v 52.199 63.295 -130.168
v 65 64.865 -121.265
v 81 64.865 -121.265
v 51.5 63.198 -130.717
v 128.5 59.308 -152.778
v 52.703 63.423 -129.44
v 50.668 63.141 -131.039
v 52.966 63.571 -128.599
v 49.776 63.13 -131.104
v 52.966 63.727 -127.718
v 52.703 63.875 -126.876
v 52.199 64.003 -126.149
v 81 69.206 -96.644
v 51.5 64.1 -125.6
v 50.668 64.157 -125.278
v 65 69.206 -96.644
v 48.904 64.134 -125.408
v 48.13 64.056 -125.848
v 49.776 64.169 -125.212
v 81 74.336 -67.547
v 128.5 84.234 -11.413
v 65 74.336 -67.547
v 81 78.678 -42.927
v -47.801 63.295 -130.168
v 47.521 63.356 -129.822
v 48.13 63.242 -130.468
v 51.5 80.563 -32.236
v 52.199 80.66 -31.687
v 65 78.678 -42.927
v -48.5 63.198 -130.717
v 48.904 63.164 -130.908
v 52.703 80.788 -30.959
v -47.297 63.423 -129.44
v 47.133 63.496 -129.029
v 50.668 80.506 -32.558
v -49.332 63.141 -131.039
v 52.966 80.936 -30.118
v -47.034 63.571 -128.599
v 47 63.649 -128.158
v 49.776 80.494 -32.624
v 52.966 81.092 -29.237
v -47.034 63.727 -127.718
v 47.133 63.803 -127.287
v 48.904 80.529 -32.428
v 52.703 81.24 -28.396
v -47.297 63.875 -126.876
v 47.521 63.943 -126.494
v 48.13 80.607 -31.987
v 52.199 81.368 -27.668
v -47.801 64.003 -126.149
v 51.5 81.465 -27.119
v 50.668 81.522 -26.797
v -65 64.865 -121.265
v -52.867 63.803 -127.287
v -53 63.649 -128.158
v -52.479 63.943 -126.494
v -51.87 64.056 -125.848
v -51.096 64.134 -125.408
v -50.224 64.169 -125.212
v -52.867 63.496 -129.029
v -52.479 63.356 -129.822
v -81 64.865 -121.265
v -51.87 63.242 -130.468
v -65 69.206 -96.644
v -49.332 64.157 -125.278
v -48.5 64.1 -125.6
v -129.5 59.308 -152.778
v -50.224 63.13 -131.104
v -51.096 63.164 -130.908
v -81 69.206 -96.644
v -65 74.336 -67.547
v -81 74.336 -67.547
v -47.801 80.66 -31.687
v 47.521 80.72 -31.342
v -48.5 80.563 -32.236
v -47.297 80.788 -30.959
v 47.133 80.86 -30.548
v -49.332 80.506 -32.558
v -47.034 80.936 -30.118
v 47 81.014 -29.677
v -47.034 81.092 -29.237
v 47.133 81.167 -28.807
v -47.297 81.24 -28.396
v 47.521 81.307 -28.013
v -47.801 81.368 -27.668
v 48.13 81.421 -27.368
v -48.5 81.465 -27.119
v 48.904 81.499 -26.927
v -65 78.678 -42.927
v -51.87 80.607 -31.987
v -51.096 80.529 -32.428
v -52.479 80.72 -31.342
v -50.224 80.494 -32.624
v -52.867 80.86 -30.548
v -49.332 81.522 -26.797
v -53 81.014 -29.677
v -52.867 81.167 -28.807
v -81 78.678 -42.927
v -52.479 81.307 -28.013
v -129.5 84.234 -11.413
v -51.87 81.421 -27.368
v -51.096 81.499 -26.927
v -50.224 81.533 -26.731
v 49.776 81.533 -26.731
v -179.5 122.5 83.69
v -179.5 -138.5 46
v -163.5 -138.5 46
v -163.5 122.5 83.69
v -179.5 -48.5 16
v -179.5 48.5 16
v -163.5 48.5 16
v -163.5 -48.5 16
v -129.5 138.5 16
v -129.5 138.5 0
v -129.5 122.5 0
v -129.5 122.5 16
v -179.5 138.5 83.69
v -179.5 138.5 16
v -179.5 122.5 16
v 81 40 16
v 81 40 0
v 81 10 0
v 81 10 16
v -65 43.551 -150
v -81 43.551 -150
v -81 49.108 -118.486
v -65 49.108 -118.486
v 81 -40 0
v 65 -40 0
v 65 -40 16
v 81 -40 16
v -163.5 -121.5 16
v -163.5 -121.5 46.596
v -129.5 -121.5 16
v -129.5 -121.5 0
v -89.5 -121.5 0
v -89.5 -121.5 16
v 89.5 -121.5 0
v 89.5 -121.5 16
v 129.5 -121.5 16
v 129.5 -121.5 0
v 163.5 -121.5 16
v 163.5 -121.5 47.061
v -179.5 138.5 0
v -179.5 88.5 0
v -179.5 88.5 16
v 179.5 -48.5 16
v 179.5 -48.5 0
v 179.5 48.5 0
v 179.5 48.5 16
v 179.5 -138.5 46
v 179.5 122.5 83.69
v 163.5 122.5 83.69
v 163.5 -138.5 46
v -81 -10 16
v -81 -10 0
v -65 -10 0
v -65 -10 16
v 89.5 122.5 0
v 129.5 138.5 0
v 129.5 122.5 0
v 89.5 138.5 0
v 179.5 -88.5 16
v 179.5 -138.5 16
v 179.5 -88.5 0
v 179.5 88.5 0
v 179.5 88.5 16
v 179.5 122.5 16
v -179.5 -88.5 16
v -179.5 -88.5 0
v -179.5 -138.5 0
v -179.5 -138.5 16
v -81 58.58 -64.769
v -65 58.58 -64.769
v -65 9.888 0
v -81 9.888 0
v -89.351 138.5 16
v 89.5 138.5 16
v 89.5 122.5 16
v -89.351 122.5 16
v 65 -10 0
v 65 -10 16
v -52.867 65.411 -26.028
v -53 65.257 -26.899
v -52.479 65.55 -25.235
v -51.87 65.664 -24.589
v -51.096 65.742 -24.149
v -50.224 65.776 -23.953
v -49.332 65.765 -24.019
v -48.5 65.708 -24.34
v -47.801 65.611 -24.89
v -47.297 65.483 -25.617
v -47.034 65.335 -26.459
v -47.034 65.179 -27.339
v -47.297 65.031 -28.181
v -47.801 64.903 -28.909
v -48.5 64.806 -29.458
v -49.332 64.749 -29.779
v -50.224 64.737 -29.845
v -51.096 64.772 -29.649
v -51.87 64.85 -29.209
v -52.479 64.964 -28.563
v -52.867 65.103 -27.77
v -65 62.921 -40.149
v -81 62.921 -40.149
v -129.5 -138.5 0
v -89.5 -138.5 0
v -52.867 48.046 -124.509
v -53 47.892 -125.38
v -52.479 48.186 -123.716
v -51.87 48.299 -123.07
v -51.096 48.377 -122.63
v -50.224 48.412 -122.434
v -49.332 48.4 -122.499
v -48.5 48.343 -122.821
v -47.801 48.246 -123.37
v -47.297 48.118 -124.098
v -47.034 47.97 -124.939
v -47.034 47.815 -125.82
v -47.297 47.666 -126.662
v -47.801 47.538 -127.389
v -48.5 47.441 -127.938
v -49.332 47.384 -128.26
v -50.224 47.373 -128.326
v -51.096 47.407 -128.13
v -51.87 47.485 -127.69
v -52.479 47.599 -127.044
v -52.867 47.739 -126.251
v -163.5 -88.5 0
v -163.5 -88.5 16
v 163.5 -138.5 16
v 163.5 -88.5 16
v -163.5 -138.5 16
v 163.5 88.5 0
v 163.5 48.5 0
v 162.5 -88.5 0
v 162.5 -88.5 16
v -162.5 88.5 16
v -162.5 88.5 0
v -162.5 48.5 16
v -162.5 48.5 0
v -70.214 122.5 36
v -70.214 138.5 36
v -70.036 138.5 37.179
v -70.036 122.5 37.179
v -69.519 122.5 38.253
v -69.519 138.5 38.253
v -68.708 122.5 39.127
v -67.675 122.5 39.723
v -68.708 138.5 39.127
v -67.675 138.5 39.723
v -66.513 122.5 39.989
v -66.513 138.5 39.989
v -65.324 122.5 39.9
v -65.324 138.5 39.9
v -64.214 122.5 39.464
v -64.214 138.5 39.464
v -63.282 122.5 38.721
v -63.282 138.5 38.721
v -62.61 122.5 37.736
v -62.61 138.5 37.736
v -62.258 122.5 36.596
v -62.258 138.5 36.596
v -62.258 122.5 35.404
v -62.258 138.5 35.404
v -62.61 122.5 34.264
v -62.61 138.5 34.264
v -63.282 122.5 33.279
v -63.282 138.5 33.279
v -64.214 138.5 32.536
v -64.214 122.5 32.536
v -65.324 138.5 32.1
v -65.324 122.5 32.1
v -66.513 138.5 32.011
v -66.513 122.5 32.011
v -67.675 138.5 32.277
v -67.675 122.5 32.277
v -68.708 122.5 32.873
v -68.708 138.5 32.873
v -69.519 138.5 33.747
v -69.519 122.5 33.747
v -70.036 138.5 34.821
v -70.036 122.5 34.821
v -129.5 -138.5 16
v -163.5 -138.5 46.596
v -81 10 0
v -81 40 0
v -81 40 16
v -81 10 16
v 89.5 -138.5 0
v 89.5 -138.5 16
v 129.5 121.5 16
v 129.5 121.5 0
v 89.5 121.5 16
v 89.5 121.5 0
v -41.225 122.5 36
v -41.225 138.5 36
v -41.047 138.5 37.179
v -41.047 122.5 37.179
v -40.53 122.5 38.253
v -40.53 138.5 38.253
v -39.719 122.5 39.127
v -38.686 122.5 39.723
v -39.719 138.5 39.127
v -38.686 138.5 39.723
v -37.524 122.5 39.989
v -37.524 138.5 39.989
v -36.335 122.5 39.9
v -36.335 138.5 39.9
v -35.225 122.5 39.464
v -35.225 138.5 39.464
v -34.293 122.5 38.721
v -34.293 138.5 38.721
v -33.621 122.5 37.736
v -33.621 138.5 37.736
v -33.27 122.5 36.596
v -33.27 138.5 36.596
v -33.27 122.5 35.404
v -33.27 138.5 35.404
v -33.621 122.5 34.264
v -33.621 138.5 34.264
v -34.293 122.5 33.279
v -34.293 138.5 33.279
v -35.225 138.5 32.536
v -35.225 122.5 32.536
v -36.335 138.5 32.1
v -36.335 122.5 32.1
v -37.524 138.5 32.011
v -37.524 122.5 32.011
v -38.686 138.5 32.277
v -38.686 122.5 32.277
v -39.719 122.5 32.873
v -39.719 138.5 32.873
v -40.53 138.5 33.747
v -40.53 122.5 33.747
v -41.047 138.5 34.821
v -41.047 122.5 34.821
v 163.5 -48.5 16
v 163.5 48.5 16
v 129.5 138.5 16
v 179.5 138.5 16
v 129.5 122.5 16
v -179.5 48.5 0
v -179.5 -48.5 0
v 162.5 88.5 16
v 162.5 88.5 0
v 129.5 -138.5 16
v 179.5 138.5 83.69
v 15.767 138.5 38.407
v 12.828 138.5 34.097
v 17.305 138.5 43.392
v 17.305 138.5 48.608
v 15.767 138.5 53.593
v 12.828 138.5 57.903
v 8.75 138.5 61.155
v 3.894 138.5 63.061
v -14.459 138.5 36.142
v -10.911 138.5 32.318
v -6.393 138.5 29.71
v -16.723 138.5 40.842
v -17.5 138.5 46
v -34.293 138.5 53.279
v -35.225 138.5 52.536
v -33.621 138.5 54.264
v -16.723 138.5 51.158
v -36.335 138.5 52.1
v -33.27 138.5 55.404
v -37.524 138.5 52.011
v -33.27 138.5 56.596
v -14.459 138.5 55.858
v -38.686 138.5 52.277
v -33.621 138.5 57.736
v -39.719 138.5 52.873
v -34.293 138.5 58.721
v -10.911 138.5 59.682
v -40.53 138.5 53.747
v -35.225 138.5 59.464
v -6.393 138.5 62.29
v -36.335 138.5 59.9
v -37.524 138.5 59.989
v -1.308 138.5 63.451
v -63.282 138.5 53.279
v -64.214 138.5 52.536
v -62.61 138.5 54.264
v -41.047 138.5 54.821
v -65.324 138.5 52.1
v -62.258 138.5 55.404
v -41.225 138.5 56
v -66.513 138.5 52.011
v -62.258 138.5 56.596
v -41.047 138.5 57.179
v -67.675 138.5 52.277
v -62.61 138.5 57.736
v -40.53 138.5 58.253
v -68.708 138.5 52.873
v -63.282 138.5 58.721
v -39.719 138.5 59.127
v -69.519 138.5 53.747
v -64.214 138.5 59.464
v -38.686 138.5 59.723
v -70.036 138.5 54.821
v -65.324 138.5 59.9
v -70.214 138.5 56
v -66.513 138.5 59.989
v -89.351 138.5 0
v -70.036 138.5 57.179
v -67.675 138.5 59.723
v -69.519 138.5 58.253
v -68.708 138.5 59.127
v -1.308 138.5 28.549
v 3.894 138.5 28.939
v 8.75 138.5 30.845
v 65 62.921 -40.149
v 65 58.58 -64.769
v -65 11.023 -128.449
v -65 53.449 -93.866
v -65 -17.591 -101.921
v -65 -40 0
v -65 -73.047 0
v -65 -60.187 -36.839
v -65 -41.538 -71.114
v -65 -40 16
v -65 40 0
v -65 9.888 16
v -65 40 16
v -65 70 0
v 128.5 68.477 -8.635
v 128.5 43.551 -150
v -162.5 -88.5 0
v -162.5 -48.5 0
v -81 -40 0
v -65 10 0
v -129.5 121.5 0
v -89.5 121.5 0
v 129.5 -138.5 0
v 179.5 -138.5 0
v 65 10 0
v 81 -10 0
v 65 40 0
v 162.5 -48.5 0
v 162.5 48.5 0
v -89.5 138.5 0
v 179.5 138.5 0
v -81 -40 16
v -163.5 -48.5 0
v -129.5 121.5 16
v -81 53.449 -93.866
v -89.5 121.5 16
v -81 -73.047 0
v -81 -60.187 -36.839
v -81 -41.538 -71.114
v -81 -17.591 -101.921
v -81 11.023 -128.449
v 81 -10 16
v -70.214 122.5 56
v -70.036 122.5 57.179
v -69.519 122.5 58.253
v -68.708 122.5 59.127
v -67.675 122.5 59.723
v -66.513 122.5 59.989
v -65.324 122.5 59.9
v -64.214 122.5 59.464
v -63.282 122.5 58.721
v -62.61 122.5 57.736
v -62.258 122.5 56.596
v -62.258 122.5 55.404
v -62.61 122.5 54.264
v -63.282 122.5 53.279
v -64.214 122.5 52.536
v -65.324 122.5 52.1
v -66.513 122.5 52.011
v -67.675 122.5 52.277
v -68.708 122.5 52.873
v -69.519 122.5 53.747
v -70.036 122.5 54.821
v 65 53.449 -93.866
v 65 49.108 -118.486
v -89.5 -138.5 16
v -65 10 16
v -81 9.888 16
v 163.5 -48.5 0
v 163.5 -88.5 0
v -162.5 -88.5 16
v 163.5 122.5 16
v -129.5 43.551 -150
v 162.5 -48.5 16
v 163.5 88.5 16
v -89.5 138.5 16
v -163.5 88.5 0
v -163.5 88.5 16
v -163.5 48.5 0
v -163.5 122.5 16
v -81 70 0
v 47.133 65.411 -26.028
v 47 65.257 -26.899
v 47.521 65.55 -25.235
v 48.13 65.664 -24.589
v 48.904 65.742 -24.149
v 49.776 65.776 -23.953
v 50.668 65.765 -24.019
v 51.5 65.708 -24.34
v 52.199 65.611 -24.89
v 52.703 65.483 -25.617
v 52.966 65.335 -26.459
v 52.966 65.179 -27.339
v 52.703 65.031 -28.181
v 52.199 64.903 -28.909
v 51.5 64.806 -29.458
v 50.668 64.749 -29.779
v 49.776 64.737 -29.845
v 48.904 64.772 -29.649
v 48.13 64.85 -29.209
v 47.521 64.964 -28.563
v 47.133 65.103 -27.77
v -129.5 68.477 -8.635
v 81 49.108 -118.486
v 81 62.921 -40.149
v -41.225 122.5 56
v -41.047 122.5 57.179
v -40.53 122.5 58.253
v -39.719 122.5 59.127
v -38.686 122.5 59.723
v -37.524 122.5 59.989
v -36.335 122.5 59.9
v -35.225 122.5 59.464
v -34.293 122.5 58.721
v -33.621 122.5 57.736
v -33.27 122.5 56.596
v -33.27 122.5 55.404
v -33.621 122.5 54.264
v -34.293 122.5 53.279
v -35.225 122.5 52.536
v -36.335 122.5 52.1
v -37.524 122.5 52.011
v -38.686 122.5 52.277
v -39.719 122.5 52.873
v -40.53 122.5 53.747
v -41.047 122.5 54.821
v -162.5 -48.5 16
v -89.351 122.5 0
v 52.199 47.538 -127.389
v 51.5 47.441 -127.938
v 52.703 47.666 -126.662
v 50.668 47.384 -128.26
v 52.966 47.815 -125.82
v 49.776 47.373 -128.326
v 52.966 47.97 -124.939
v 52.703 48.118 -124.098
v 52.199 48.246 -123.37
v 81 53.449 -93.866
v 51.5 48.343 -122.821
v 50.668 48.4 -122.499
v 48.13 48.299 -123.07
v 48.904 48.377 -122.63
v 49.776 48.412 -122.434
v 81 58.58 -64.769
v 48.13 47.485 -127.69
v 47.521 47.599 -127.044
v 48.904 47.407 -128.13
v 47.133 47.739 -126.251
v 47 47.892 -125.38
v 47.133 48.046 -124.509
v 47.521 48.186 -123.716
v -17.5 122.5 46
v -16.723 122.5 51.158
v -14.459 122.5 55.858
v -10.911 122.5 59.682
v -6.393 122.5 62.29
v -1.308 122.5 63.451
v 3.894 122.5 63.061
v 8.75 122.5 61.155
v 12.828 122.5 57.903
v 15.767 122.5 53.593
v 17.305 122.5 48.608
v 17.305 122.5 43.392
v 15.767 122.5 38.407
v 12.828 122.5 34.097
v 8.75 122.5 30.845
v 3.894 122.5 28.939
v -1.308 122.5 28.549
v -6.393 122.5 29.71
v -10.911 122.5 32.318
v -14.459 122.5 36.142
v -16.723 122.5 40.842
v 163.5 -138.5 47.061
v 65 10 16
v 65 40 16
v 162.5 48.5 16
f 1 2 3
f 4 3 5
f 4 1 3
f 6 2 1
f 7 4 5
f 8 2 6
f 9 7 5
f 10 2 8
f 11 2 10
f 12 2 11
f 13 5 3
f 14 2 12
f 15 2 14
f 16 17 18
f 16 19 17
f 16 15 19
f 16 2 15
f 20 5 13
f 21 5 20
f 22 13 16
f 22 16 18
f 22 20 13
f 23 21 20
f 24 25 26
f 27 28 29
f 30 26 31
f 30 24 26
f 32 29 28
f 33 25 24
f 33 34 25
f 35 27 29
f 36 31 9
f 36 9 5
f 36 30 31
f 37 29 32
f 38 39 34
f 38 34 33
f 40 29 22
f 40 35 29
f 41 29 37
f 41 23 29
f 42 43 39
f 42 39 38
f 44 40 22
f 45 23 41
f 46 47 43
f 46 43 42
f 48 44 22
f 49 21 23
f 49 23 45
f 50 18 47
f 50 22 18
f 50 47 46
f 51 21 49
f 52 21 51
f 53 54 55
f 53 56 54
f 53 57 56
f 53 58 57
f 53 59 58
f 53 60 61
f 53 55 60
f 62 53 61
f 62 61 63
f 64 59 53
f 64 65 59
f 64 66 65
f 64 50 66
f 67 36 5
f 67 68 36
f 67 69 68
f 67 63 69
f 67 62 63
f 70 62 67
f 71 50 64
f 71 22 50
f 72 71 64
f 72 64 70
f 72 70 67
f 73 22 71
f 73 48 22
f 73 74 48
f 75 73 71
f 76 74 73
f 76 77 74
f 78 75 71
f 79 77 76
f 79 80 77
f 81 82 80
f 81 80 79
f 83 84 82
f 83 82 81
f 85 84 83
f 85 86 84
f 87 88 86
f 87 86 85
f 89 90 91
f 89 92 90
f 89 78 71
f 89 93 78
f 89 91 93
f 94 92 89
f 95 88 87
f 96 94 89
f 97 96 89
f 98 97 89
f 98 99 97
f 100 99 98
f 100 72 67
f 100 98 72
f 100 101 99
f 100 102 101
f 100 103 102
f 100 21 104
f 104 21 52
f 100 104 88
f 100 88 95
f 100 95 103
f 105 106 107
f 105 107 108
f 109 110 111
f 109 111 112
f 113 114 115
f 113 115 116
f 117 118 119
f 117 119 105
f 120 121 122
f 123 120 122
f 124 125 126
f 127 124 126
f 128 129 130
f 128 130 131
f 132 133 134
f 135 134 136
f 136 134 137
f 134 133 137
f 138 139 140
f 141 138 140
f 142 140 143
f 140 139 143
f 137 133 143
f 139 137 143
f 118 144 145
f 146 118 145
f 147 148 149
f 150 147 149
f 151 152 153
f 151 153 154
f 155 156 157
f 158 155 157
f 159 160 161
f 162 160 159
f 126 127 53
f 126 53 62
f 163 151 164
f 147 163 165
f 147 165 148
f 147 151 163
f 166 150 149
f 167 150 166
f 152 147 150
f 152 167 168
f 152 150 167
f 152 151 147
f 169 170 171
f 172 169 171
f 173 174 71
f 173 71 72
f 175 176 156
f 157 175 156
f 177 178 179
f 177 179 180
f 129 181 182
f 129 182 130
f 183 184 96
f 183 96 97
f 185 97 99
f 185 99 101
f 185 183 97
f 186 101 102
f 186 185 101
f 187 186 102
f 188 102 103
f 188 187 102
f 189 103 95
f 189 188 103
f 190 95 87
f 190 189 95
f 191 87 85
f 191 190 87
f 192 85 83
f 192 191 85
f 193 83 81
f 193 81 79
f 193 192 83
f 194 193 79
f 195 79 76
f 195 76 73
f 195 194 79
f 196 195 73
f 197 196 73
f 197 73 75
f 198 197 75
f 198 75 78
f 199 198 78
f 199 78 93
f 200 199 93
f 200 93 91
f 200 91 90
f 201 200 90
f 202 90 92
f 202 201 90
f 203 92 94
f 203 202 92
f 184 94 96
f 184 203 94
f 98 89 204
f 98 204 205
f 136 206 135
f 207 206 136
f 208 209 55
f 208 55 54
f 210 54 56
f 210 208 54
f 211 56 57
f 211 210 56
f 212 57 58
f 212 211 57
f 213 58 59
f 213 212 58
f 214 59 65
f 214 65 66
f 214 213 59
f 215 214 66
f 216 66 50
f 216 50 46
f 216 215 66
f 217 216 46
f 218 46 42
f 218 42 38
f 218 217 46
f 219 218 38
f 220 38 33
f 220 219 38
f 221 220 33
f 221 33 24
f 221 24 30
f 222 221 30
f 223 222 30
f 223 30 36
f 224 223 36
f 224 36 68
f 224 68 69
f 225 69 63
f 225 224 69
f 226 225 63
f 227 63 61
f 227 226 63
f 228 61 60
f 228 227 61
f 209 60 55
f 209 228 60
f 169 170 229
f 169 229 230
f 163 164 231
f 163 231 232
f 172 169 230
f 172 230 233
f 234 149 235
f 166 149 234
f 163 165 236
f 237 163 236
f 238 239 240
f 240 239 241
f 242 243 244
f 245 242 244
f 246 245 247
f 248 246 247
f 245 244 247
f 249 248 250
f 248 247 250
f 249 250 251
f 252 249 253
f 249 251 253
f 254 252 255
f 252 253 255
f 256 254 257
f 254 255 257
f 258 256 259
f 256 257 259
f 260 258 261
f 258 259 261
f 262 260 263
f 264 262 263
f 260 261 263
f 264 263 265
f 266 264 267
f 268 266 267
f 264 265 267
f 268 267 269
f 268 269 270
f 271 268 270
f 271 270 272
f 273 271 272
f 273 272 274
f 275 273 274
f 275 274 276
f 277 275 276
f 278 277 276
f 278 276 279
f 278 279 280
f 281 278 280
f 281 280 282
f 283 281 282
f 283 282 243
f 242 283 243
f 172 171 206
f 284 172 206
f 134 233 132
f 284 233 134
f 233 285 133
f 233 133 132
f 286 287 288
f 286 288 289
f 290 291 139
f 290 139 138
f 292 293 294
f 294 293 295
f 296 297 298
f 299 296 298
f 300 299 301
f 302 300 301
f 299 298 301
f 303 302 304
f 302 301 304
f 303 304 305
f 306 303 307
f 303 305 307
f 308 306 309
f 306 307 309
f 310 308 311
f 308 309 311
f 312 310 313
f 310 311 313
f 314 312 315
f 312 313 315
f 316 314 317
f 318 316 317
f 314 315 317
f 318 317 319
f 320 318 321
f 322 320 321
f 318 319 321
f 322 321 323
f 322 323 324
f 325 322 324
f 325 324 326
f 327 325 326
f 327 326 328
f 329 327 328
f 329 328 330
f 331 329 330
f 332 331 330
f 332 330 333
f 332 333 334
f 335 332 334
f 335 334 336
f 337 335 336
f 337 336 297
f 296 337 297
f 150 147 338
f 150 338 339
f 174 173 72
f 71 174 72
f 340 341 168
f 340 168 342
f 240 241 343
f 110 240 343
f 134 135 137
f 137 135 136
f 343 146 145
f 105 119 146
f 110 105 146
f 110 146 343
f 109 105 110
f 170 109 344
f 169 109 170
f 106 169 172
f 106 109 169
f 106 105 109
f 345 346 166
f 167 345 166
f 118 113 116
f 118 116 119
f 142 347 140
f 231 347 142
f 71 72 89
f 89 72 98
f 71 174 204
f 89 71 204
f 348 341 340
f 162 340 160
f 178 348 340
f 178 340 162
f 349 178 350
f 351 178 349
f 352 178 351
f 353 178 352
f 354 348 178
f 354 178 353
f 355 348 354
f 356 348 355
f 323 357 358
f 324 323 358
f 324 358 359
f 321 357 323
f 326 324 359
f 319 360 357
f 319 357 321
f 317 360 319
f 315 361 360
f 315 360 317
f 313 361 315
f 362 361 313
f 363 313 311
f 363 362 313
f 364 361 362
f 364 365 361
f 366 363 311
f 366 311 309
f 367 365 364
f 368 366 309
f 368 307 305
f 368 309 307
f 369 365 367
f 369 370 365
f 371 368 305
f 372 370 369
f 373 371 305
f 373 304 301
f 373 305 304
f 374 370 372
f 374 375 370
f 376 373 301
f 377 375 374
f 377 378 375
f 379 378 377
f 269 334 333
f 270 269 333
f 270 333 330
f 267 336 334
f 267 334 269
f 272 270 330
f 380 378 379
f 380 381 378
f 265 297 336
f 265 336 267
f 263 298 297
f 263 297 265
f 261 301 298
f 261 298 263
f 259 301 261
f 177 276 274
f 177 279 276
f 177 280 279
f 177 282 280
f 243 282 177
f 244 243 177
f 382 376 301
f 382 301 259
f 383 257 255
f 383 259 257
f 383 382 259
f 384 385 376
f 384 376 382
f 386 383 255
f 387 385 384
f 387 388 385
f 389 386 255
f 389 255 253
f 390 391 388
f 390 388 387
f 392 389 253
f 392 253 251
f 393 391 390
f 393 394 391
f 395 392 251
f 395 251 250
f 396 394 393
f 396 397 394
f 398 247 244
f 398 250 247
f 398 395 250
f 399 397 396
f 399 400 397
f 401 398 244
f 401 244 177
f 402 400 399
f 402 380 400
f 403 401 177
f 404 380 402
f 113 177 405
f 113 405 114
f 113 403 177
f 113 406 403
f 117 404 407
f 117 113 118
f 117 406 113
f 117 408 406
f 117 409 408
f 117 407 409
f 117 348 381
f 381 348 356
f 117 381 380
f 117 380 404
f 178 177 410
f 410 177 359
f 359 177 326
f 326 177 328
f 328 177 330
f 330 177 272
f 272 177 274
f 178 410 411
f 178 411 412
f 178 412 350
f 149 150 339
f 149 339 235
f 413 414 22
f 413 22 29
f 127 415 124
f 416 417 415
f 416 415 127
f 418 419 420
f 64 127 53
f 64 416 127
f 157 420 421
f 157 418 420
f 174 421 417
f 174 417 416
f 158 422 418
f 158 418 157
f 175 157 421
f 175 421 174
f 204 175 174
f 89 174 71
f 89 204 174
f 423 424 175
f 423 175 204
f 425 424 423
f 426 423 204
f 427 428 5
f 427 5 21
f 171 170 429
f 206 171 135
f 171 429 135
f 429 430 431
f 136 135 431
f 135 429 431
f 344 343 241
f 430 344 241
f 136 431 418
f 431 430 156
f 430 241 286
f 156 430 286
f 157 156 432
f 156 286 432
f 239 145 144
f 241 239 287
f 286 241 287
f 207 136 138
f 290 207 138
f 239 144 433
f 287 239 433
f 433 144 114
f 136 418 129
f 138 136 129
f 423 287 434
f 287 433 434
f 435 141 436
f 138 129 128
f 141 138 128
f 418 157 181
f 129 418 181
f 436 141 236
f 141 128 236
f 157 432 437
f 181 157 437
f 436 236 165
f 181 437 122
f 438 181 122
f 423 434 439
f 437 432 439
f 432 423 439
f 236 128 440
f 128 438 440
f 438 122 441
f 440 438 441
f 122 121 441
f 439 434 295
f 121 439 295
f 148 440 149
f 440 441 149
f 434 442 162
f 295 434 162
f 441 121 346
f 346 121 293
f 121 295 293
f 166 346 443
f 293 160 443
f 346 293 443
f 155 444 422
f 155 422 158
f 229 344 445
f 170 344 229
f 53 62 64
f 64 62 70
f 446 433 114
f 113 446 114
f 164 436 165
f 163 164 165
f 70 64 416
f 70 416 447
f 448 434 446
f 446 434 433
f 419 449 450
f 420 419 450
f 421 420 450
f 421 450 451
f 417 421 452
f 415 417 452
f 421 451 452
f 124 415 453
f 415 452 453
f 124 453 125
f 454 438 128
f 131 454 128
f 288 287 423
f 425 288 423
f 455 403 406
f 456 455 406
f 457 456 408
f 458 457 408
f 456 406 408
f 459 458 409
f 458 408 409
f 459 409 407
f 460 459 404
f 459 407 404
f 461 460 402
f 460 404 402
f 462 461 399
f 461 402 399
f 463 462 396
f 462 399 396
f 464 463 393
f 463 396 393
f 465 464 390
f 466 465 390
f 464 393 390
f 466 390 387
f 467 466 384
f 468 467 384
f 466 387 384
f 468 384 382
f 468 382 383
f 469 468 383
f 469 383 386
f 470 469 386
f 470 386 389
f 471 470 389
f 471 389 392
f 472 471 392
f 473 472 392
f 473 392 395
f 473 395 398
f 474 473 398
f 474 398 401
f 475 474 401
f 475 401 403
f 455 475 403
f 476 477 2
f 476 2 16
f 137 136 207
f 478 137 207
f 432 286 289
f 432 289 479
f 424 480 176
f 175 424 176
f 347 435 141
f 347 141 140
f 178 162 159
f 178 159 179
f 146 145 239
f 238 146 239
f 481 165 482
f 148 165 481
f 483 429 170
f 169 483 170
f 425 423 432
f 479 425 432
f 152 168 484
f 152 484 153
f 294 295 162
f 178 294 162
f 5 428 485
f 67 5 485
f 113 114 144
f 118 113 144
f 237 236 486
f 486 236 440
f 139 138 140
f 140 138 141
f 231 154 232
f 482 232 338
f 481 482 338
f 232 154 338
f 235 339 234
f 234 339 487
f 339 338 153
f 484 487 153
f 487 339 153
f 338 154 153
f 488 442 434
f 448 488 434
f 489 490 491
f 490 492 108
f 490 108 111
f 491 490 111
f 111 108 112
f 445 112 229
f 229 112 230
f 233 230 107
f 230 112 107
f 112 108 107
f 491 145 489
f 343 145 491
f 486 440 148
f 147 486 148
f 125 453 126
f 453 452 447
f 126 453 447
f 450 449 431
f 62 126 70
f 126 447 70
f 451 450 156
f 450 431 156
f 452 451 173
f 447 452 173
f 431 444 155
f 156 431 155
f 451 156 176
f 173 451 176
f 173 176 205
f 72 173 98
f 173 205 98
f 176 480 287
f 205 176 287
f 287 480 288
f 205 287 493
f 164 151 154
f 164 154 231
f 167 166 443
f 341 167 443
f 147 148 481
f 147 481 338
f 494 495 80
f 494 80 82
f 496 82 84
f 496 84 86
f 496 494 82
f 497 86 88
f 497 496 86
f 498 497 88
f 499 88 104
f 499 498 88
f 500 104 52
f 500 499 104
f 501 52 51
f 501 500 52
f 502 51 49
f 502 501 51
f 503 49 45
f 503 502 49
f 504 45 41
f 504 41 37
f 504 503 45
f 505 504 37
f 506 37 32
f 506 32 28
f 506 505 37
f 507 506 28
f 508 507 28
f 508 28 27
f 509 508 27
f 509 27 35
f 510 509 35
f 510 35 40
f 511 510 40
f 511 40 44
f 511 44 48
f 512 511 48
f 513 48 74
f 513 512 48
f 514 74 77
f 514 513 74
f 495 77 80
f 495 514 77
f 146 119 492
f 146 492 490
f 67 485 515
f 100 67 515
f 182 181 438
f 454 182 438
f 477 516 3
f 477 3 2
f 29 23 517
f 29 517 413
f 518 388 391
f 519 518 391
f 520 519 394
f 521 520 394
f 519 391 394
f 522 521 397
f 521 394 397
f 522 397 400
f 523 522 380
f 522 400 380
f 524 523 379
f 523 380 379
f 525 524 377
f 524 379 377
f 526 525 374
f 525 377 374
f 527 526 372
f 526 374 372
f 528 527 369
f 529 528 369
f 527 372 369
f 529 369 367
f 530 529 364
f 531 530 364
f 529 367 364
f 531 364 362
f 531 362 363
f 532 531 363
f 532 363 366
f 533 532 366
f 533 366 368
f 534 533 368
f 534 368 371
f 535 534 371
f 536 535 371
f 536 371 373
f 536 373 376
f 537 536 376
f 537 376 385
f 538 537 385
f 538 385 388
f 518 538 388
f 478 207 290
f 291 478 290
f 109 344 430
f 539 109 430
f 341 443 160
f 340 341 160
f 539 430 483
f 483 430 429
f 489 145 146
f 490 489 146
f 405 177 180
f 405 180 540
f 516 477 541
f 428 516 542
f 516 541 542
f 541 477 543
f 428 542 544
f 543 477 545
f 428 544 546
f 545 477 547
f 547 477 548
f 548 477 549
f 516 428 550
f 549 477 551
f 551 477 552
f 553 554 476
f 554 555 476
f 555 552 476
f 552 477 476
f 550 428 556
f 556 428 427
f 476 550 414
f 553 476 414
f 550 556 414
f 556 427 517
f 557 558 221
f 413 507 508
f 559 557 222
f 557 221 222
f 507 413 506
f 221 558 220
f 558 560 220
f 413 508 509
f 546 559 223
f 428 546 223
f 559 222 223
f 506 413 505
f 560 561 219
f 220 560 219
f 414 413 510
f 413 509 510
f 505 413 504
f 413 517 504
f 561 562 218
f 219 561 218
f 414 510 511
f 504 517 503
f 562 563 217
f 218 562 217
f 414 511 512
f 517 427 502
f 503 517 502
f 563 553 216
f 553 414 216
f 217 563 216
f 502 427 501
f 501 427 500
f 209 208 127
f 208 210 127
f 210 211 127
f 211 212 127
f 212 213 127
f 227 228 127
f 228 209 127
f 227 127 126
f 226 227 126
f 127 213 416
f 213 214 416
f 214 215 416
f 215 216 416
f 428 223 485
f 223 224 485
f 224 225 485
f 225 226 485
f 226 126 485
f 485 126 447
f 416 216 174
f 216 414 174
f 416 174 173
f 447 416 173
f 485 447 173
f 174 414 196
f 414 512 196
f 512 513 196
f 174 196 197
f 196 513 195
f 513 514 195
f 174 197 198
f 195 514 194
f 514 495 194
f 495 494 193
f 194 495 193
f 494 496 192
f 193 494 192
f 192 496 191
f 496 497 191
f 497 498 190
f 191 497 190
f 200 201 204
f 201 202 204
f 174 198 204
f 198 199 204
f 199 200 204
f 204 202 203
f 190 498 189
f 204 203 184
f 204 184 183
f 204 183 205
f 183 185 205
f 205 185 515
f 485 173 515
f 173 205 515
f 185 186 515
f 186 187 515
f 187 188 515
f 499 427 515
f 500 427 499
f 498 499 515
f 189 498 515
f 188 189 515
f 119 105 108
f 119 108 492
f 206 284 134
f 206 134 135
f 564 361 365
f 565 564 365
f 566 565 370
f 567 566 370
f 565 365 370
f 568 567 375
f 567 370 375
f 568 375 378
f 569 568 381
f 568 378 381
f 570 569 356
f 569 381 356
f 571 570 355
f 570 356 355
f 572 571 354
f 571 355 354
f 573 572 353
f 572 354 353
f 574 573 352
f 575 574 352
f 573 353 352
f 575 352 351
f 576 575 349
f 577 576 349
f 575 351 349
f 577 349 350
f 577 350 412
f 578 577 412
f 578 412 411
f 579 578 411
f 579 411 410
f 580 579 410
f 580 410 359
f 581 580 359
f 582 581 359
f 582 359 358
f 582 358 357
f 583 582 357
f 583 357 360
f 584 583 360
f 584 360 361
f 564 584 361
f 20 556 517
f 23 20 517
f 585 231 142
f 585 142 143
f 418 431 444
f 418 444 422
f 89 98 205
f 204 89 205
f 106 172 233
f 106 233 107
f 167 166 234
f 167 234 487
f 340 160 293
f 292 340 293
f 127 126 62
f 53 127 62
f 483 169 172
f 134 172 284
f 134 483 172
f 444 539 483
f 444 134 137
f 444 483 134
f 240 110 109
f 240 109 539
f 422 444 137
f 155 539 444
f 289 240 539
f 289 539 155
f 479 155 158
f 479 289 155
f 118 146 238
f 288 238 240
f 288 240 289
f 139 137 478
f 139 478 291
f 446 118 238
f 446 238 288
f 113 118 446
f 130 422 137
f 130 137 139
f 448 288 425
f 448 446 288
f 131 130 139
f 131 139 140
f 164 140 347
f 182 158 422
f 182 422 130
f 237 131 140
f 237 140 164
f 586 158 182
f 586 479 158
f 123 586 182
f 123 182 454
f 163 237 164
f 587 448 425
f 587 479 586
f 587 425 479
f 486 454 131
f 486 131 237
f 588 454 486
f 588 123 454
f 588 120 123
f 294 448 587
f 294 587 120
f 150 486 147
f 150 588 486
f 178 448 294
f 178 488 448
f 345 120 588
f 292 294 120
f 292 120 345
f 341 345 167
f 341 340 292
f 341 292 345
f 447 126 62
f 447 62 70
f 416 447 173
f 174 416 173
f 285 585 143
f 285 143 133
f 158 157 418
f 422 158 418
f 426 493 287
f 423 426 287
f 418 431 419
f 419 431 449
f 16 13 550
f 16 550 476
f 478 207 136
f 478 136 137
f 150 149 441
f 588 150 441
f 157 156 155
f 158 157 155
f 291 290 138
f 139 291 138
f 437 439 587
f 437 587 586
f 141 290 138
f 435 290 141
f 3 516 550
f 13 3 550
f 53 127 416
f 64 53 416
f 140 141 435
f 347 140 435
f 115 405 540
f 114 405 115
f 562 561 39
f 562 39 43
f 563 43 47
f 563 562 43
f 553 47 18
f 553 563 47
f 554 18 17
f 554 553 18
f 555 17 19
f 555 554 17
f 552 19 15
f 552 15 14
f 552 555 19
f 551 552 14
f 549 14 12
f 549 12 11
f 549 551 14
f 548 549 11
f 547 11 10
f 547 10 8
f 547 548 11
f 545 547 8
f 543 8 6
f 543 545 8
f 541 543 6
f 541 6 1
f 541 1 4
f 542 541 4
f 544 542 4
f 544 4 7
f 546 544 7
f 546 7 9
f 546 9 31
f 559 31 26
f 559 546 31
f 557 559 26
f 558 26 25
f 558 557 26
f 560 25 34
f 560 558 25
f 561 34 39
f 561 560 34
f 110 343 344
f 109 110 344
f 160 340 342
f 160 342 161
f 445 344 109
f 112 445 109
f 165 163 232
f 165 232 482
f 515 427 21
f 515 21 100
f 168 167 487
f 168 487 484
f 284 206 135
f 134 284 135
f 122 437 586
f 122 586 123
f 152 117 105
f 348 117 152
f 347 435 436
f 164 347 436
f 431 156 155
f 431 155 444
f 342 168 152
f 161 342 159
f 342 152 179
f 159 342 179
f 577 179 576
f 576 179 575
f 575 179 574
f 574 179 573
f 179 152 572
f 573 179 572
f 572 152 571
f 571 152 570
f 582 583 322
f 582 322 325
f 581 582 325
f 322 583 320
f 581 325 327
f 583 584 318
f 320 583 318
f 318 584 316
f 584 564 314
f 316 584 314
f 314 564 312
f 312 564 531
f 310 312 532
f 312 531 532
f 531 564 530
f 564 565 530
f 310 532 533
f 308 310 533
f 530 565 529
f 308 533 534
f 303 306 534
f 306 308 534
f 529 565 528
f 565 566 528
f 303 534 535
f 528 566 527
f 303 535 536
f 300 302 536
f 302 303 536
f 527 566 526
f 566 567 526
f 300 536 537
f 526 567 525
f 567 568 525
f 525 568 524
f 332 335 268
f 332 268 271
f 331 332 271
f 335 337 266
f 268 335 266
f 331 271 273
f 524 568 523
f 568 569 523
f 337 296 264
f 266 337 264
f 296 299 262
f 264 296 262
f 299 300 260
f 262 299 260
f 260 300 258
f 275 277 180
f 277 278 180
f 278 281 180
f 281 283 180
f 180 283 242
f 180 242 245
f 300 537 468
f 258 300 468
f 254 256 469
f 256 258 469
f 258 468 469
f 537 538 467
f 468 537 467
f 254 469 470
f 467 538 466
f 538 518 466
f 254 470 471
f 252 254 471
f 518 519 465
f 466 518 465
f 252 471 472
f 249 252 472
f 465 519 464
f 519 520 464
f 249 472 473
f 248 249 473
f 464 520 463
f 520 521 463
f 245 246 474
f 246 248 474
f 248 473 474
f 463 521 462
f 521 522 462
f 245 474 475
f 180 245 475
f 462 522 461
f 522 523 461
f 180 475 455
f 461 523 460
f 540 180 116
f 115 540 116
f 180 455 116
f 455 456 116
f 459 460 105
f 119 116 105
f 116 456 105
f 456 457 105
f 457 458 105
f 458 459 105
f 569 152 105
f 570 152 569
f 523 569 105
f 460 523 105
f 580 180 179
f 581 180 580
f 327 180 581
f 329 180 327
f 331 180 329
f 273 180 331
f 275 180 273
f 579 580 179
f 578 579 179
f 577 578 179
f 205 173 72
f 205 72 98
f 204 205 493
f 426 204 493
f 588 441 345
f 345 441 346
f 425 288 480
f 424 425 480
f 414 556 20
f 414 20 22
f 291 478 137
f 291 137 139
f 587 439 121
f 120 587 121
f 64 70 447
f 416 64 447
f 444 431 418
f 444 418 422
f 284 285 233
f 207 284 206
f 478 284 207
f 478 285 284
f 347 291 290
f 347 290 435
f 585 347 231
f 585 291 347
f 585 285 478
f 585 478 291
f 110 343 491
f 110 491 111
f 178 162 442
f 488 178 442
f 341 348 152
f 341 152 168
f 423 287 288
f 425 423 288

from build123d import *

# Parameters (mm, degrees)
F1_DEPTH  = 16
F2_W      = 40
F2_H      = 16
F3_DEPTH  = 16
F5_DEPTH  = 16
F7_DEPTH  = 16
F9_DEPTH  = 17
F10_R     = 17.5
F10_R_2   = 4
F11_DEPTH = 25
F12_W     = 16
F12_H     = 30
F13_DEPTH = 25
F14_W     = 30
F14_H     = 16
F15_DEPTH = 16
F16_W     = 258
F16_H     = 143.5460233889
F16_R     = 3
F16_W_2   = 16
F16_H_2   = 25
F17_DEPTH = 16


with BuildPart() as f1:
    # F0 (on Top) → F1 (new body)
    with BuildSketch(Plane.XY):
        Polygon((129.5, -138.5), (179.5, -138.5), (179.5, -88.5), (162.5, -88.5), (162.5, -48.5), (179.5, -48.5), (179.5, 48.5), (162.5, 48.5), (162.5, 88.5), (179.5, 88.5), (179.5, 138.5), (129.5, 138.5), (129.5, 121.5), (89.5, 121.5), (89.5, 138.5), (-89.5, 138.5), (-89.5, 121.5), (-129.5, 121.5), (-129.5, 138.5), (-179.5, 138.5), (-179.5, 88.5), (-162.5, 88.5), (-162.5, 48.5), (-179.5, 48.5), (-179.5, -48.5), (-162.5, -48.5), (-162.5, -88.5), (-179.5, -88.5), (-179.5, -138.5), (-129.5, -138.5), (-129.5, -121.5), (-89.5, -121.5), (-89.5, -138.5), (89.5, -138.5), (89.5, -121.5), (129.5, -121.5), align=None)
    extrude(amount=F1_DEPTH)

    # F12 (on face) → F13 (cut)
    with BuildSketch(Plane(origin=(0, 0, 0), x_dir=(1, 0, 0), z_dir=(0, 0, -1))):
        with Locations((73, -25)):
            Rectangle(F12_W, F12_H)
        with Locations((73, 25)):
            Rectangle(F12_W, F12_H)
        with Locations((-73, -25)):
            Rectangle(F12_W, F12_H)
        with Locations((-73, 25)):
            Rectangle(F12_W, F12_H)
    extrude(amount=-F13_DEPTH, mode=Mode.SUBTRACT)


with BuildPart() as f3:
    # F2 (on face) → F3 (new body)
    with BuildSketch(Plane(origin=(-179.5, 0, 0), x_dir=(0, -1, 0), z_dir=(-1, 0, 0))):
        with Locations((-68.5, 8)):
            Rectangle(F2_W, F2_H)
        with Locations((68.5, 8)):
            Rectangle(F2_W, F2_H)
        Polygon((-122.5, 16), (-88.5, 16), (-48.5, 16), (48.5, 16), (88.5, 16), (138.5, 16), (138.5, 46), (-122.5, 83.6895306859), align=None)
    extrude(amount=-F3_DEPTH)


with BuildPart() as f5:
    # F4 (on face) → F5 (new body)
    with BuildSketch(Plane(origin=(0, 138.5, 0), x_dir=(-1, 0, 0), z_dir=(0, 1, 0))):
        Polygon((129.5, 16), (179.5, 16), (179.5, 83.6895306859), (-179.5, 83.6895306859), (-179.5, 16), (-129.5, 16), (-129.5, 0), (-89.5, 0), (-89.5, 16), (89.3506407738, 16), (89.3506407738, 0), (129.5, 0), align=None)
    extrude(amount=-F5_DEPTH)

    # F10 (on face) → F11 (cut)
    with BuildSketch(Plane(origin=(0, 138.5, 0), x_dir=(-1, 0, 0), z_dir=(0, 1, 0))):
        with Locations((0, 46)):
            Circle(F10_R)
        with Locations((37.2249260545, 56)):
            Circle(F10_R_2)
        with Locations((66.2137439211, 56)):
            Circle(F10_R_2)
        with Locations((66.2137439211, 36)):
            Circle(F10_R_2)
        with Locations((37.2249260545, 36)):
            Circle(F10_R_2)
    extrude(amount=-F11_DEPTH, mode=Mode.SUBTRACT)


with BuildPart() as f7:
    # F6 (on face) → F7 (new body)
    with BuildSketch(Plane.YZ.offset(179.5)):
        Polygon((-138.5, 46), (-138.5, 16), (-88.5, 16), (-88.5, 0), (-48.5, 0), (-48.5, 16), (48.5, 16), (48.5, 0), (88.5, 0), (88.5, 16), (122.5, 16), (122.5, 83.6895306859), align=None)
    extrude(amount=-F7_DEPTH)


with BuildPart() as f9:
    # F8 (on face) → F9 (new body)
    with BuildSketch(Plane.XZ.offset(138.5)):
        Polygon((163.5, 47.0611862838), (-163.5, 46.5962067246), (-163.5, 16), (-129.5, 16), (-129.5, 0), (-89.5, 0), (-89.5, 16), (89.5, 16), (89.5, 0), (129.5, 0), (129.5, 16), (163.5, 16), align=None)
    extrude(amount=-F9_DEPTH)


with BuildPart() as f15:
    # F14 (on face) → F15 (new body)
    with BuildSketch(Plane.YZ.offset(-81)):
        with Locations((-25, 8)):
            Rectangle(F14_W, F14_H)
        Polygon((53.4488990207, -93.8659580783), (49.1076945791, -118.4861519036), (64.8646186273, -121.2645227463), (69.2058230689, -96.644328921), align=None)
        Polygon((62.9207125198, -40.1486343825), (58.5795080781, -64.7688282078), (74.3364321263, -67.5471990505), (78.677636568, -42.9270052252), align=None)
        with BuildLine():
            Line((-10, 0), (-40, 0))
            Line((-40, 0), (-73.0473920703, 0))
            ThreePointArc((-73.0473920703, 0), (-30.1908089692, -87.0038690918), (43.5509528937, -150))
            Line((43.5509528937, -150), (49.1076945791, -118.4861519036))
            Line((49.1076945791, -118.4861519036), (53.4488990207, -93.8659580783))
            Line((53.4488990207, -93.8659580783), (58.5795080781, -64.7688282078))
            Line((58.5795080781, -64.7688282078), (62.9207125198, -40.1486343825))
            Line((62.9207125198, -40.1486343825), (70, 0))
            Line((70, 0), (40, 0))
            Line((40, 0), (40, 16))
            Line((40, 16), (9.887823835, 16))
            Line((9.887823835, 16), (9.887823835, 0))
            Line((9.887823835, 0), (-10, 0))
        make_face()
    extrude(amount=F15_DEPTH)


with BuildPart() as f17:
    # F16 (on face) → F17 (new body)
    with BuildSketch(Plane(origin=(0, 67.8892417275, -11.9707050164), x_dir=(-1, 0, 0), z_dir=(0, 0.984807753, -0.1736481777))):
        with Locations((0.5, -68.3856076517)):
            Rectangle(F16_W, F16_H)
        with Locations((-50, -115.1586193462)):
            Circle(F16_R, mode=Mode.SUBTRACT)
        with Locations((-73, -95.6586193462)):
            Rectangle(F16_W_2, F16_H_2, mode=Mode.SUBTRACT)
        with Locations((50, -115.1586193462)):
            Circle(F16_R, mode=Mode.SUBTRACT)
        with Locations((73, -95.6586193462)):
            Rectangle(F16_W_2, F16_H_2, mode=Mode.SUBTRACT)
        with Locations((-73, -41.1125959573)):
            Rectangle(F16_W_2, F16_H_2, mode=Mode.SUBTRACT)
        with Locations((-50, -15.1586193462)):
            Circle(F16_R, mode=Mode.SUBTRACT)
        with Locations((73, -41.1125959573)):
            Rectangle(F16_W_2, F16_H_2, mode=Mode.SUBTRACT)
        with Locations((50, -15.1586193462)):
            Circle(F16_R, mode=Mode.SUBTRACT)
    extrude(amount=F17_DEPTH)


solid = Compound([f1.part, f3.part, f5.part, f7.part, f9.part, f15.part, f17.part])
